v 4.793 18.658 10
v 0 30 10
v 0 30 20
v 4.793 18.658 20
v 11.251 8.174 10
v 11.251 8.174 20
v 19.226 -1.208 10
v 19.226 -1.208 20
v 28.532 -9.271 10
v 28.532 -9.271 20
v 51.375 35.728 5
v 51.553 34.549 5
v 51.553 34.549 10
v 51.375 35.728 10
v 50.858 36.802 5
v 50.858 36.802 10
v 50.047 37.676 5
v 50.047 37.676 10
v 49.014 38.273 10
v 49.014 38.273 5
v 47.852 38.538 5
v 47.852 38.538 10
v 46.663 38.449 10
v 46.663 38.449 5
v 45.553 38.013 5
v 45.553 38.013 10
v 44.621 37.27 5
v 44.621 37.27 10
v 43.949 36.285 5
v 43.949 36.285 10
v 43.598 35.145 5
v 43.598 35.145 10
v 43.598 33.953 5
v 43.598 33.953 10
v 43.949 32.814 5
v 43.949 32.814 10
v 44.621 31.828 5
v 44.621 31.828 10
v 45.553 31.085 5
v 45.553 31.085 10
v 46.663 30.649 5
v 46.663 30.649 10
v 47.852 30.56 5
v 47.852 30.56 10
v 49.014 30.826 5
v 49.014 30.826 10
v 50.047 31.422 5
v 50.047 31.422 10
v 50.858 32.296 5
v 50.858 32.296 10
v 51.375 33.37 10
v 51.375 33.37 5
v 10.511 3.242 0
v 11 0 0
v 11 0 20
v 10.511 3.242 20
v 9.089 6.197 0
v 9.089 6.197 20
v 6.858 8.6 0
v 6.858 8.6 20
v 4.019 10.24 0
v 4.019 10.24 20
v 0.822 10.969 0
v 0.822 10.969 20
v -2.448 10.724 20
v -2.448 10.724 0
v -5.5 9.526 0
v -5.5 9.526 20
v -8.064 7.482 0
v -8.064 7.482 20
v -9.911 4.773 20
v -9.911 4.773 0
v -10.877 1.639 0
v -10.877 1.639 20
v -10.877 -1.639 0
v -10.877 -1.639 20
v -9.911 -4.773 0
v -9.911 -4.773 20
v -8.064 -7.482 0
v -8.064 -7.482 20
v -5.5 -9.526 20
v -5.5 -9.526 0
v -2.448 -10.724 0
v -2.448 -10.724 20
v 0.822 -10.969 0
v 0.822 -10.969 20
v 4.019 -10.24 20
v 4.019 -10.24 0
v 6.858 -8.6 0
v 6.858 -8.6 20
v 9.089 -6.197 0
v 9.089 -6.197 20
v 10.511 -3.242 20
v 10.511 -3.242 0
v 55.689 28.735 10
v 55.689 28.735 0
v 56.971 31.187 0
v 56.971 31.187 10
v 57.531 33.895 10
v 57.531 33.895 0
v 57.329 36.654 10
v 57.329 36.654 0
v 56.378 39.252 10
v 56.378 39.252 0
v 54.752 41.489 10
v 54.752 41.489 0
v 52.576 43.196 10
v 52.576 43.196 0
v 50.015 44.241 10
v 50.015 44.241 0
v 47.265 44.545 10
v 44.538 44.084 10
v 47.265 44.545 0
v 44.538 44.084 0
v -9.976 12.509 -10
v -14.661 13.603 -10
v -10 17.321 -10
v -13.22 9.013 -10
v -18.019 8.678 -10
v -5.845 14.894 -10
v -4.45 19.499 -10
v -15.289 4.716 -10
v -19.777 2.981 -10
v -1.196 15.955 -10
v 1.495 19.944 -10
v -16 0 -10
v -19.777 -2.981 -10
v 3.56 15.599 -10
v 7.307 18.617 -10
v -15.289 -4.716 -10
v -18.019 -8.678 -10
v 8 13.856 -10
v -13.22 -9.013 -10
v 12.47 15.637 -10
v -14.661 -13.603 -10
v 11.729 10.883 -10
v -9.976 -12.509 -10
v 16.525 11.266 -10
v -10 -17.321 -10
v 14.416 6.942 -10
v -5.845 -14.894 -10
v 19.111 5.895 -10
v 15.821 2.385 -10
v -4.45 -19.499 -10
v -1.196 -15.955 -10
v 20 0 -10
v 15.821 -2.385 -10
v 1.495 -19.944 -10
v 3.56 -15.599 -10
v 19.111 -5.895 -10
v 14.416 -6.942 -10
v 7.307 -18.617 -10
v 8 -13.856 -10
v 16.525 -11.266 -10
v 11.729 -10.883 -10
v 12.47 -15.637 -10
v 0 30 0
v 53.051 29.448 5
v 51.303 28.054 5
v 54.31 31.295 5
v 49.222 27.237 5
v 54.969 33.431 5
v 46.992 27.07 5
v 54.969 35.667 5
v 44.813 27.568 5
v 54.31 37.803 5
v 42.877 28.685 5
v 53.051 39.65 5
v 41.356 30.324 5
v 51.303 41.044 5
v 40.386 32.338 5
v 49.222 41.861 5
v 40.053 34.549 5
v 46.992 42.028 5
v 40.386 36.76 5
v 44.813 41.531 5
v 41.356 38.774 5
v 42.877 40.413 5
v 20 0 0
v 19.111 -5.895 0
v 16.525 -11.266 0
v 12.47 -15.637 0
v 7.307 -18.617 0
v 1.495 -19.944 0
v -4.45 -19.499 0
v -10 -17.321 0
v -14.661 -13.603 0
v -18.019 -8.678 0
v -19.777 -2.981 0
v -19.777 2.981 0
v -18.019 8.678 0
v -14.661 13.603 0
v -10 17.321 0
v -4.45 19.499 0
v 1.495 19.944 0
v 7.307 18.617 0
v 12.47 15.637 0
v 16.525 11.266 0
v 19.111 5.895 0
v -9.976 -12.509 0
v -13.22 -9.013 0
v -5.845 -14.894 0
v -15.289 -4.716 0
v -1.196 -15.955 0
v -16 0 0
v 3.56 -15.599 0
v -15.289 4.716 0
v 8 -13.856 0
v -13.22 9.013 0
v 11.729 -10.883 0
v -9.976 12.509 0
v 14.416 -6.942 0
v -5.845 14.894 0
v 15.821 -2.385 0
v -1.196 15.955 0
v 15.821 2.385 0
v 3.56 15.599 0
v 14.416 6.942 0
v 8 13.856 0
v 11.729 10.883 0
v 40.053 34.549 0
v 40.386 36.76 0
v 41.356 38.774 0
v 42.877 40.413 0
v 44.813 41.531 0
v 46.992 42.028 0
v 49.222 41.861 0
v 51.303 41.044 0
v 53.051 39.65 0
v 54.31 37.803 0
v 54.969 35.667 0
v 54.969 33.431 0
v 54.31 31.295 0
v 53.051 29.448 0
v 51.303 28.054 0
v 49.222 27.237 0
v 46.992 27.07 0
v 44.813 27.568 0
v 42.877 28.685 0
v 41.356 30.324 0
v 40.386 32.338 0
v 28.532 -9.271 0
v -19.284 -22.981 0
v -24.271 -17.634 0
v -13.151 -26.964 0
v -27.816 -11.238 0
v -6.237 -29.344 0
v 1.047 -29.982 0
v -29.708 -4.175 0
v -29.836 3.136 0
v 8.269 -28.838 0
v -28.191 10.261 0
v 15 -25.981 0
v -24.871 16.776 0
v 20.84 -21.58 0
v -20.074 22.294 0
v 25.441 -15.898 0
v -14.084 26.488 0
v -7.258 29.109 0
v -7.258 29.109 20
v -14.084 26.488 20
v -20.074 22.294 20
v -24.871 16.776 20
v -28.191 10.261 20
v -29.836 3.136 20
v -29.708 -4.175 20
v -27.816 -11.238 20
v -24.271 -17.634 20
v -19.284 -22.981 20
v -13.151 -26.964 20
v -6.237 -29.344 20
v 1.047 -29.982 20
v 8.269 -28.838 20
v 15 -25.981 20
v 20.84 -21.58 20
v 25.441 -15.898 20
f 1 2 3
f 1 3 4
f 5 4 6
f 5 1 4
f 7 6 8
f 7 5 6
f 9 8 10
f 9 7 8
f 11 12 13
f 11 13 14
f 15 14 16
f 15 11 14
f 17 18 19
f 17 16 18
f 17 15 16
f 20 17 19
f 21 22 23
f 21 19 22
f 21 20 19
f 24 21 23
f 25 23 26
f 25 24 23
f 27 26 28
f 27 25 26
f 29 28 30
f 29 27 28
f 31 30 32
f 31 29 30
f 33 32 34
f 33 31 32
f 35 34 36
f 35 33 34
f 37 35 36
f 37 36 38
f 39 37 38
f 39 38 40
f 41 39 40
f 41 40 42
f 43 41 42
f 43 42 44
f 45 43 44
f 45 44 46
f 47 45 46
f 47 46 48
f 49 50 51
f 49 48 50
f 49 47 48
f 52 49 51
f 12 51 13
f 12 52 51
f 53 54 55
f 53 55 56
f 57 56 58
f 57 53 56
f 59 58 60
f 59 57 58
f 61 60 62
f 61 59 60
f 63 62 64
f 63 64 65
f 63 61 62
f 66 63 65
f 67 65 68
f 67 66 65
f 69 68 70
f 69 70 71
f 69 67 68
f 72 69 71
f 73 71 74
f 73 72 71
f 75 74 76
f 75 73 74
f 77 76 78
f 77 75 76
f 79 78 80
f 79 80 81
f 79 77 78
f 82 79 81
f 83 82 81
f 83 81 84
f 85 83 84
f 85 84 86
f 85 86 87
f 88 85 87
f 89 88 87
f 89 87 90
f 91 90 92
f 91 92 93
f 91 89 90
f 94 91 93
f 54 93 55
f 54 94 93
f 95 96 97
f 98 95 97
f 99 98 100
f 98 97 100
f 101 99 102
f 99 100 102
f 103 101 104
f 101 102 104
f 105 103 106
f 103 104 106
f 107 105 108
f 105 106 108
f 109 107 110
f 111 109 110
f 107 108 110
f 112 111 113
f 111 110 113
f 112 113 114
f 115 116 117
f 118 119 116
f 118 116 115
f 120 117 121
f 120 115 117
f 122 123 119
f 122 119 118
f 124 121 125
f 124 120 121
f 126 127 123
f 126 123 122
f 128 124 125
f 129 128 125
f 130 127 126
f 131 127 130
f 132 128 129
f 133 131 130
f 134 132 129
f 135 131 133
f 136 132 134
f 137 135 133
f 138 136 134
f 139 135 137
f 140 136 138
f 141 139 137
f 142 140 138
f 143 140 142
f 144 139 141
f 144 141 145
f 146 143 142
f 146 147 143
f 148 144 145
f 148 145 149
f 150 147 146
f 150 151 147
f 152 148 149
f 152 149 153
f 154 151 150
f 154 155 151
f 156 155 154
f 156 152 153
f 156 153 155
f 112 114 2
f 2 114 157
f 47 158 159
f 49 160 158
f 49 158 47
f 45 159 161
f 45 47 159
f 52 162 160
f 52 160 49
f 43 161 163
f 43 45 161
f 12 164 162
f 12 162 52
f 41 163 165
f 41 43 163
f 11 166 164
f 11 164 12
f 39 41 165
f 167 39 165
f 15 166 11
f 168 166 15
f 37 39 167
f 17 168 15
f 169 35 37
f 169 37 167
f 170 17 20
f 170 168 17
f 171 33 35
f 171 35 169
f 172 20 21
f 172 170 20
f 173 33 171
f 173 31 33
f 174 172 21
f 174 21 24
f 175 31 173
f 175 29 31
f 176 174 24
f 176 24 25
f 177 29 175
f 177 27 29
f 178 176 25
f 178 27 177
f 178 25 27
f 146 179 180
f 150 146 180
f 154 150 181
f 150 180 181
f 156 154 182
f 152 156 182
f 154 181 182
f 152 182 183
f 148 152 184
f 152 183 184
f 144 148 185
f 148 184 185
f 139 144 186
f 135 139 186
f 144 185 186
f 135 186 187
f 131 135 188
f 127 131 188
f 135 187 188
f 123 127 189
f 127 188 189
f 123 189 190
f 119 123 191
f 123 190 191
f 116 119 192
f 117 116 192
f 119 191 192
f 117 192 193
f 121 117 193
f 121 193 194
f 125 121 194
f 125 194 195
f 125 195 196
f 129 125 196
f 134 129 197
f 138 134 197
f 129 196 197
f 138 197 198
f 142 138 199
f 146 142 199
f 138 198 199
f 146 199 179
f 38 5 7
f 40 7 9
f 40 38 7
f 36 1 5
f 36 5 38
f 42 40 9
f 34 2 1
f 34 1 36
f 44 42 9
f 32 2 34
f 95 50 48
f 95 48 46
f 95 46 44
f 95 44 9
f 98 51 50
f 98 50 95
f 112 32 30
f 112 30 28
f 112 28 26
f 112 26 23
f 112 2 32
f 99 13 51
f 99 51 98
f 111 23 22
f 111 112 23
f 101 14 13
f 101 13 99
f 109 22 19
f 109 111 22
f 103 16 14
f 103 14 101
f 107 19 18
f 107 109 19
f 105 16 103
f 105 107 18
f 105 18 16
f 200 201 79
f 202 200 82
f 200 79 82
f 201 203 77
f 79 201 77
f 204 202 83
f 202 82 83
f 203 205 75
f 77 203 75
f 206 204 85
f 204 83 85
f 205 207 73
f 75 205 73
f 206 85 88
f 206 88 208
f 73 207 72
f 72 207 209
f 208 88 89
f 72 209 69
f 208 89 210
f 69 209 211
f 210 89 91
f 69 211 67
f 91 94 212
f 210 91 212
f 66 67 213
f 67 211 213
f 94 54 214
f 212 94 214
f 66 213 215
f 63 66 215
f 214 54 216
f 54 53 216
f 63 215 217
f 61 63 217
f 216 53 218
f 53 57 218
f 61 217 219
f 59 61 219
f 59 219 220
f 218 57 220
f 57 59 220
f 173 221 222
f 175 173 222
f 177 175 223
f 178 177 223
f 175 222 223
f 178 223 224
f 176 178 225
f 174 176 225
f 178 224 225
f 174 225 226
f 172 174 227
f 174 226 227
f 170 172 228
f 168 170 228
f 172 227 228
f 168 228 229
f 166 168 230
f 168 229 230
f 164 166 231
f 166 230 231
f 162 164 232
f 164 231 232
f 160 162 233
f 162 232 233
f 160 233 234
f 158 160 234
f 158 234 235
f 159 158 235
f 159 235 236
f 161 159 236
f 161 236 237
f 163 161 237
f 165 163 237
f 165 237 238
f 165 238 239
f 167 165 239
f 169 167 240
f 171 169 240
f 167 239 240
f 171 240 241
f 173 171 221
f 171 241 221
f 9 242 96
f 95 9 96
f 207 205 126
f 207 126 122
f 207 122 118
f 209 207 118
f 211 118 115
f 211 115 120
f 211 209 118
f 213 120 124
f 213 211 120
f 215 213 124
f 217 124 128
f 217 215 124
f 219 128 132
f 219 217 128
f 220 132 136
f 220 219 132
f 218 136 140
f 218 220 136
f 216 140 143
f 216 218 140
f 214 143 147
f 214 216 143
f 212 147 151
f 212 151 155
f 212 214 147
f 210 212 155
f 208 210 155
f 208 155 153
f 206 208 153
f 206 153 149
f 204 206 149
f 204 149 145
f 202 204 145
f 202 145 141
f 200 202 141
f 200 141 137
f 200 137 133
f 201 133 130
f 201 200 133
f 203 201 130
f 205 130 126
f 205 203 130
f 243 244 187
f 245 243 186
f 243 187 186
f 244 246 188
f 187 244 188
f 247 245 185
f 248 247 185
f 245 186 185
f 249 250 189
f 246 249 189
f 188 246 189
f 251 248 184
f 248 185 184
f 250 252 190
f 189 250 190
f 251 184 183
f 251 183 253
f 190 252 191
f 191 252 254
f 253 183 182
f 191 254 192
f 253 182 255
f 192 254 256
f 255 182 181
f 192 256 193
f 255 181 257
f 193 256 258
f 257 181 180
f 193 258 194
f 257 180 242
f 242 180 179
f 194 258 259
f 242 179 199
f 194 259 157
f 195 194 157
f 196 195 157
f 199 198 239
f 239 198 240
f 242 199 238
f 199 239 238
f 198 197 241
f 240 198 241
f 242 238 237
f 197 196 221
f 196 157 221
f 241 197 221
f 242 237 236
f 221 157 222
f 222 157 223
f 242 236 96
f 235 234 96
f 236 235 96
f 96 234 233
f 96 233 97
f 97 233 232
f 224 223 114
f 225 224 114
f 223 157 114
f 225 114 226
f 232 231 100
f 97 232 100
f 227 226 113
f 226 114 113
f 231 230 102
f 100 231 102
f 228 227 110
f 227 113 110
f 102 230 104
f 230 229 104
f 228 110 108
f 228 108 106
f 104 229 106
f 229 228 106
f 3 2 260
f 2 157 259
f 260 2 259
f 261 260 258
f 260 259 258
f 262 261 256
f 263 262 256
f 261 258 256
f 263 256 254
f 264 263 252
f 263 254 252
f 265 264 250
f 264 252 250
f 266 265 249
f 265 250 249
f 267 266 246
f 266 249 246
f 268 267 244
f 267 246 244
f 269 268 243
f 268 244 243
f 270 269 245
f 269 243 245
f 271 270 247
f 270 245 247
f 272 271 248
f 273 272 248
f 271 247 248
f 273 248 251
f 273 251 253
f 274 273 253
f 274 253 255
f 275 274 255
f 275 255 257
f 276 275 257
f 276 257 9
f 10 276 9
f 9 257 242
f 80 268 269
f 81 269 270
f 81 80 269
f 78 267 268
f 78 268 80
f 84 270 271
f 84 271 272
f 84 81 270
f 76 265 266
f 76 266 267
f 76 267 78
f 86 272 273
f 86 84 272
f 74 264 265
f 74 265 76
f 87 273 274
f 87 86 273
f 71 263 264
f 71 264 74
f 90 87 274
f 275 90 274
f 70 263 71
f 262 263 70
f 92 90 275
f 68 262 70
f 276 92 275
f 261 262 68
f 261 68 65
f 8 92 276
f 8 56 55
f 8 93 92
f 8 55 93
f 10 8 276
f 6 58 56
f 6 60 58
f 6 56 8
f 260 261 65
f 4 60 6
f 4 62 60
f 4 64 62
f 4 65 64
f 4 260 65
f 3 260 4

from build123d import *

# Parameters (mm, degrees)
SKETCH2_R           = 4
SKETCH2_R_2         = 11
BOSS_EXTRUDE1_DEPTH = 20
SKETCH3_R           = 7.5
CUT_EXTRUDE1_DEPTH  = 5
SKETCH4_R           = 20
SKETCH4_R_2         = 16
BOSS_EXTRUDE2_DEPTH = 10
CUT_EXTRUDE2_START  = -10
CUT_EXTRUDE2_DEPTH  = 10


with BuildPart() as part:
    # Sketch2 → Boss-Extrude1 (new body)
    with BuildSketch(Plane.XY):
        with BuildLine():
            Line((44.537767857, 44.08379372), (0, 30))
            ThreePointArc((0, 30), (-24.270509831, -17.633557569), (28.531695489, -9.270509831))
            Line((28.531695489, -9.270509831), (55.68910644, 28.735292906))
            ThreePointArc((55.68910644, 28.735292906), (55.642995759, 40.427002804), (44.537767857, 44.08379372))
        make_face()
        with Locations((47.552825815, 34.549150281)):
            Circle(SKETCH2_R, mode=Mode.SUBTRACT)
        Circle(SKETCH2_R_2, mode=Mode.SUBTRACT)
    extrude(amount=BOSS_EXTRUDE1_DEPTH)

    # Sketch3 → Cut-Extrude1 (cut)
    with BuildSketch(Plane(origin=(0, 0, 0), x_dir=(-1, 0, 0), z_dir=(0, 0, -1))):
        with Locations((-47.552825815, 34.549150281)):
            Circle(SKETCH3_R)
    extrude(amount=-CUT_EXTRUDE1_DEPTH, mode=Mode.SUBTRACT)

    # Sketch4 → Boss-Extrude2 (add)
    with BuildSketch(Plane(origin=(0, 0, 0), x_dir=(-1, 0, 0), z_dir=(0, 0, -1))):
        with Locations(Location((0, 0, 0), (0, 0, 180))):
            Circle(SKETCH4_R)
        Circle(SKETCH4_R_2, mode=Mode.SUBTRACT)
    extrude(amount=BOSS_EXTRUDE2_DEPTH)

    # Sketch5 → Cut-Extrude2 (cut)
    with BuildSketch(Plane.XY.offset(20).offset(CUT_EXTRUDE2_START)):
        with BuildLine():
            Line((44.537767857, 44.08379372), (0, 30))
            ThreePointArc((0, 30), (11.251062951, 8.174375719), (28.531695489, -9.270509831))
            Line((28.531695489, -9.270509831), (55.68910644, 28.735292906))
            ThreePointArc((55.68910644, 28.735292906), (55.642995759, 40.427002804), (44.537767857, 44.08379372))
        make_face()
    extrude(amount=CUT_EXTRUDE2_DEPTH, mode=Mode.SUBTRACT)


solid = part.part
